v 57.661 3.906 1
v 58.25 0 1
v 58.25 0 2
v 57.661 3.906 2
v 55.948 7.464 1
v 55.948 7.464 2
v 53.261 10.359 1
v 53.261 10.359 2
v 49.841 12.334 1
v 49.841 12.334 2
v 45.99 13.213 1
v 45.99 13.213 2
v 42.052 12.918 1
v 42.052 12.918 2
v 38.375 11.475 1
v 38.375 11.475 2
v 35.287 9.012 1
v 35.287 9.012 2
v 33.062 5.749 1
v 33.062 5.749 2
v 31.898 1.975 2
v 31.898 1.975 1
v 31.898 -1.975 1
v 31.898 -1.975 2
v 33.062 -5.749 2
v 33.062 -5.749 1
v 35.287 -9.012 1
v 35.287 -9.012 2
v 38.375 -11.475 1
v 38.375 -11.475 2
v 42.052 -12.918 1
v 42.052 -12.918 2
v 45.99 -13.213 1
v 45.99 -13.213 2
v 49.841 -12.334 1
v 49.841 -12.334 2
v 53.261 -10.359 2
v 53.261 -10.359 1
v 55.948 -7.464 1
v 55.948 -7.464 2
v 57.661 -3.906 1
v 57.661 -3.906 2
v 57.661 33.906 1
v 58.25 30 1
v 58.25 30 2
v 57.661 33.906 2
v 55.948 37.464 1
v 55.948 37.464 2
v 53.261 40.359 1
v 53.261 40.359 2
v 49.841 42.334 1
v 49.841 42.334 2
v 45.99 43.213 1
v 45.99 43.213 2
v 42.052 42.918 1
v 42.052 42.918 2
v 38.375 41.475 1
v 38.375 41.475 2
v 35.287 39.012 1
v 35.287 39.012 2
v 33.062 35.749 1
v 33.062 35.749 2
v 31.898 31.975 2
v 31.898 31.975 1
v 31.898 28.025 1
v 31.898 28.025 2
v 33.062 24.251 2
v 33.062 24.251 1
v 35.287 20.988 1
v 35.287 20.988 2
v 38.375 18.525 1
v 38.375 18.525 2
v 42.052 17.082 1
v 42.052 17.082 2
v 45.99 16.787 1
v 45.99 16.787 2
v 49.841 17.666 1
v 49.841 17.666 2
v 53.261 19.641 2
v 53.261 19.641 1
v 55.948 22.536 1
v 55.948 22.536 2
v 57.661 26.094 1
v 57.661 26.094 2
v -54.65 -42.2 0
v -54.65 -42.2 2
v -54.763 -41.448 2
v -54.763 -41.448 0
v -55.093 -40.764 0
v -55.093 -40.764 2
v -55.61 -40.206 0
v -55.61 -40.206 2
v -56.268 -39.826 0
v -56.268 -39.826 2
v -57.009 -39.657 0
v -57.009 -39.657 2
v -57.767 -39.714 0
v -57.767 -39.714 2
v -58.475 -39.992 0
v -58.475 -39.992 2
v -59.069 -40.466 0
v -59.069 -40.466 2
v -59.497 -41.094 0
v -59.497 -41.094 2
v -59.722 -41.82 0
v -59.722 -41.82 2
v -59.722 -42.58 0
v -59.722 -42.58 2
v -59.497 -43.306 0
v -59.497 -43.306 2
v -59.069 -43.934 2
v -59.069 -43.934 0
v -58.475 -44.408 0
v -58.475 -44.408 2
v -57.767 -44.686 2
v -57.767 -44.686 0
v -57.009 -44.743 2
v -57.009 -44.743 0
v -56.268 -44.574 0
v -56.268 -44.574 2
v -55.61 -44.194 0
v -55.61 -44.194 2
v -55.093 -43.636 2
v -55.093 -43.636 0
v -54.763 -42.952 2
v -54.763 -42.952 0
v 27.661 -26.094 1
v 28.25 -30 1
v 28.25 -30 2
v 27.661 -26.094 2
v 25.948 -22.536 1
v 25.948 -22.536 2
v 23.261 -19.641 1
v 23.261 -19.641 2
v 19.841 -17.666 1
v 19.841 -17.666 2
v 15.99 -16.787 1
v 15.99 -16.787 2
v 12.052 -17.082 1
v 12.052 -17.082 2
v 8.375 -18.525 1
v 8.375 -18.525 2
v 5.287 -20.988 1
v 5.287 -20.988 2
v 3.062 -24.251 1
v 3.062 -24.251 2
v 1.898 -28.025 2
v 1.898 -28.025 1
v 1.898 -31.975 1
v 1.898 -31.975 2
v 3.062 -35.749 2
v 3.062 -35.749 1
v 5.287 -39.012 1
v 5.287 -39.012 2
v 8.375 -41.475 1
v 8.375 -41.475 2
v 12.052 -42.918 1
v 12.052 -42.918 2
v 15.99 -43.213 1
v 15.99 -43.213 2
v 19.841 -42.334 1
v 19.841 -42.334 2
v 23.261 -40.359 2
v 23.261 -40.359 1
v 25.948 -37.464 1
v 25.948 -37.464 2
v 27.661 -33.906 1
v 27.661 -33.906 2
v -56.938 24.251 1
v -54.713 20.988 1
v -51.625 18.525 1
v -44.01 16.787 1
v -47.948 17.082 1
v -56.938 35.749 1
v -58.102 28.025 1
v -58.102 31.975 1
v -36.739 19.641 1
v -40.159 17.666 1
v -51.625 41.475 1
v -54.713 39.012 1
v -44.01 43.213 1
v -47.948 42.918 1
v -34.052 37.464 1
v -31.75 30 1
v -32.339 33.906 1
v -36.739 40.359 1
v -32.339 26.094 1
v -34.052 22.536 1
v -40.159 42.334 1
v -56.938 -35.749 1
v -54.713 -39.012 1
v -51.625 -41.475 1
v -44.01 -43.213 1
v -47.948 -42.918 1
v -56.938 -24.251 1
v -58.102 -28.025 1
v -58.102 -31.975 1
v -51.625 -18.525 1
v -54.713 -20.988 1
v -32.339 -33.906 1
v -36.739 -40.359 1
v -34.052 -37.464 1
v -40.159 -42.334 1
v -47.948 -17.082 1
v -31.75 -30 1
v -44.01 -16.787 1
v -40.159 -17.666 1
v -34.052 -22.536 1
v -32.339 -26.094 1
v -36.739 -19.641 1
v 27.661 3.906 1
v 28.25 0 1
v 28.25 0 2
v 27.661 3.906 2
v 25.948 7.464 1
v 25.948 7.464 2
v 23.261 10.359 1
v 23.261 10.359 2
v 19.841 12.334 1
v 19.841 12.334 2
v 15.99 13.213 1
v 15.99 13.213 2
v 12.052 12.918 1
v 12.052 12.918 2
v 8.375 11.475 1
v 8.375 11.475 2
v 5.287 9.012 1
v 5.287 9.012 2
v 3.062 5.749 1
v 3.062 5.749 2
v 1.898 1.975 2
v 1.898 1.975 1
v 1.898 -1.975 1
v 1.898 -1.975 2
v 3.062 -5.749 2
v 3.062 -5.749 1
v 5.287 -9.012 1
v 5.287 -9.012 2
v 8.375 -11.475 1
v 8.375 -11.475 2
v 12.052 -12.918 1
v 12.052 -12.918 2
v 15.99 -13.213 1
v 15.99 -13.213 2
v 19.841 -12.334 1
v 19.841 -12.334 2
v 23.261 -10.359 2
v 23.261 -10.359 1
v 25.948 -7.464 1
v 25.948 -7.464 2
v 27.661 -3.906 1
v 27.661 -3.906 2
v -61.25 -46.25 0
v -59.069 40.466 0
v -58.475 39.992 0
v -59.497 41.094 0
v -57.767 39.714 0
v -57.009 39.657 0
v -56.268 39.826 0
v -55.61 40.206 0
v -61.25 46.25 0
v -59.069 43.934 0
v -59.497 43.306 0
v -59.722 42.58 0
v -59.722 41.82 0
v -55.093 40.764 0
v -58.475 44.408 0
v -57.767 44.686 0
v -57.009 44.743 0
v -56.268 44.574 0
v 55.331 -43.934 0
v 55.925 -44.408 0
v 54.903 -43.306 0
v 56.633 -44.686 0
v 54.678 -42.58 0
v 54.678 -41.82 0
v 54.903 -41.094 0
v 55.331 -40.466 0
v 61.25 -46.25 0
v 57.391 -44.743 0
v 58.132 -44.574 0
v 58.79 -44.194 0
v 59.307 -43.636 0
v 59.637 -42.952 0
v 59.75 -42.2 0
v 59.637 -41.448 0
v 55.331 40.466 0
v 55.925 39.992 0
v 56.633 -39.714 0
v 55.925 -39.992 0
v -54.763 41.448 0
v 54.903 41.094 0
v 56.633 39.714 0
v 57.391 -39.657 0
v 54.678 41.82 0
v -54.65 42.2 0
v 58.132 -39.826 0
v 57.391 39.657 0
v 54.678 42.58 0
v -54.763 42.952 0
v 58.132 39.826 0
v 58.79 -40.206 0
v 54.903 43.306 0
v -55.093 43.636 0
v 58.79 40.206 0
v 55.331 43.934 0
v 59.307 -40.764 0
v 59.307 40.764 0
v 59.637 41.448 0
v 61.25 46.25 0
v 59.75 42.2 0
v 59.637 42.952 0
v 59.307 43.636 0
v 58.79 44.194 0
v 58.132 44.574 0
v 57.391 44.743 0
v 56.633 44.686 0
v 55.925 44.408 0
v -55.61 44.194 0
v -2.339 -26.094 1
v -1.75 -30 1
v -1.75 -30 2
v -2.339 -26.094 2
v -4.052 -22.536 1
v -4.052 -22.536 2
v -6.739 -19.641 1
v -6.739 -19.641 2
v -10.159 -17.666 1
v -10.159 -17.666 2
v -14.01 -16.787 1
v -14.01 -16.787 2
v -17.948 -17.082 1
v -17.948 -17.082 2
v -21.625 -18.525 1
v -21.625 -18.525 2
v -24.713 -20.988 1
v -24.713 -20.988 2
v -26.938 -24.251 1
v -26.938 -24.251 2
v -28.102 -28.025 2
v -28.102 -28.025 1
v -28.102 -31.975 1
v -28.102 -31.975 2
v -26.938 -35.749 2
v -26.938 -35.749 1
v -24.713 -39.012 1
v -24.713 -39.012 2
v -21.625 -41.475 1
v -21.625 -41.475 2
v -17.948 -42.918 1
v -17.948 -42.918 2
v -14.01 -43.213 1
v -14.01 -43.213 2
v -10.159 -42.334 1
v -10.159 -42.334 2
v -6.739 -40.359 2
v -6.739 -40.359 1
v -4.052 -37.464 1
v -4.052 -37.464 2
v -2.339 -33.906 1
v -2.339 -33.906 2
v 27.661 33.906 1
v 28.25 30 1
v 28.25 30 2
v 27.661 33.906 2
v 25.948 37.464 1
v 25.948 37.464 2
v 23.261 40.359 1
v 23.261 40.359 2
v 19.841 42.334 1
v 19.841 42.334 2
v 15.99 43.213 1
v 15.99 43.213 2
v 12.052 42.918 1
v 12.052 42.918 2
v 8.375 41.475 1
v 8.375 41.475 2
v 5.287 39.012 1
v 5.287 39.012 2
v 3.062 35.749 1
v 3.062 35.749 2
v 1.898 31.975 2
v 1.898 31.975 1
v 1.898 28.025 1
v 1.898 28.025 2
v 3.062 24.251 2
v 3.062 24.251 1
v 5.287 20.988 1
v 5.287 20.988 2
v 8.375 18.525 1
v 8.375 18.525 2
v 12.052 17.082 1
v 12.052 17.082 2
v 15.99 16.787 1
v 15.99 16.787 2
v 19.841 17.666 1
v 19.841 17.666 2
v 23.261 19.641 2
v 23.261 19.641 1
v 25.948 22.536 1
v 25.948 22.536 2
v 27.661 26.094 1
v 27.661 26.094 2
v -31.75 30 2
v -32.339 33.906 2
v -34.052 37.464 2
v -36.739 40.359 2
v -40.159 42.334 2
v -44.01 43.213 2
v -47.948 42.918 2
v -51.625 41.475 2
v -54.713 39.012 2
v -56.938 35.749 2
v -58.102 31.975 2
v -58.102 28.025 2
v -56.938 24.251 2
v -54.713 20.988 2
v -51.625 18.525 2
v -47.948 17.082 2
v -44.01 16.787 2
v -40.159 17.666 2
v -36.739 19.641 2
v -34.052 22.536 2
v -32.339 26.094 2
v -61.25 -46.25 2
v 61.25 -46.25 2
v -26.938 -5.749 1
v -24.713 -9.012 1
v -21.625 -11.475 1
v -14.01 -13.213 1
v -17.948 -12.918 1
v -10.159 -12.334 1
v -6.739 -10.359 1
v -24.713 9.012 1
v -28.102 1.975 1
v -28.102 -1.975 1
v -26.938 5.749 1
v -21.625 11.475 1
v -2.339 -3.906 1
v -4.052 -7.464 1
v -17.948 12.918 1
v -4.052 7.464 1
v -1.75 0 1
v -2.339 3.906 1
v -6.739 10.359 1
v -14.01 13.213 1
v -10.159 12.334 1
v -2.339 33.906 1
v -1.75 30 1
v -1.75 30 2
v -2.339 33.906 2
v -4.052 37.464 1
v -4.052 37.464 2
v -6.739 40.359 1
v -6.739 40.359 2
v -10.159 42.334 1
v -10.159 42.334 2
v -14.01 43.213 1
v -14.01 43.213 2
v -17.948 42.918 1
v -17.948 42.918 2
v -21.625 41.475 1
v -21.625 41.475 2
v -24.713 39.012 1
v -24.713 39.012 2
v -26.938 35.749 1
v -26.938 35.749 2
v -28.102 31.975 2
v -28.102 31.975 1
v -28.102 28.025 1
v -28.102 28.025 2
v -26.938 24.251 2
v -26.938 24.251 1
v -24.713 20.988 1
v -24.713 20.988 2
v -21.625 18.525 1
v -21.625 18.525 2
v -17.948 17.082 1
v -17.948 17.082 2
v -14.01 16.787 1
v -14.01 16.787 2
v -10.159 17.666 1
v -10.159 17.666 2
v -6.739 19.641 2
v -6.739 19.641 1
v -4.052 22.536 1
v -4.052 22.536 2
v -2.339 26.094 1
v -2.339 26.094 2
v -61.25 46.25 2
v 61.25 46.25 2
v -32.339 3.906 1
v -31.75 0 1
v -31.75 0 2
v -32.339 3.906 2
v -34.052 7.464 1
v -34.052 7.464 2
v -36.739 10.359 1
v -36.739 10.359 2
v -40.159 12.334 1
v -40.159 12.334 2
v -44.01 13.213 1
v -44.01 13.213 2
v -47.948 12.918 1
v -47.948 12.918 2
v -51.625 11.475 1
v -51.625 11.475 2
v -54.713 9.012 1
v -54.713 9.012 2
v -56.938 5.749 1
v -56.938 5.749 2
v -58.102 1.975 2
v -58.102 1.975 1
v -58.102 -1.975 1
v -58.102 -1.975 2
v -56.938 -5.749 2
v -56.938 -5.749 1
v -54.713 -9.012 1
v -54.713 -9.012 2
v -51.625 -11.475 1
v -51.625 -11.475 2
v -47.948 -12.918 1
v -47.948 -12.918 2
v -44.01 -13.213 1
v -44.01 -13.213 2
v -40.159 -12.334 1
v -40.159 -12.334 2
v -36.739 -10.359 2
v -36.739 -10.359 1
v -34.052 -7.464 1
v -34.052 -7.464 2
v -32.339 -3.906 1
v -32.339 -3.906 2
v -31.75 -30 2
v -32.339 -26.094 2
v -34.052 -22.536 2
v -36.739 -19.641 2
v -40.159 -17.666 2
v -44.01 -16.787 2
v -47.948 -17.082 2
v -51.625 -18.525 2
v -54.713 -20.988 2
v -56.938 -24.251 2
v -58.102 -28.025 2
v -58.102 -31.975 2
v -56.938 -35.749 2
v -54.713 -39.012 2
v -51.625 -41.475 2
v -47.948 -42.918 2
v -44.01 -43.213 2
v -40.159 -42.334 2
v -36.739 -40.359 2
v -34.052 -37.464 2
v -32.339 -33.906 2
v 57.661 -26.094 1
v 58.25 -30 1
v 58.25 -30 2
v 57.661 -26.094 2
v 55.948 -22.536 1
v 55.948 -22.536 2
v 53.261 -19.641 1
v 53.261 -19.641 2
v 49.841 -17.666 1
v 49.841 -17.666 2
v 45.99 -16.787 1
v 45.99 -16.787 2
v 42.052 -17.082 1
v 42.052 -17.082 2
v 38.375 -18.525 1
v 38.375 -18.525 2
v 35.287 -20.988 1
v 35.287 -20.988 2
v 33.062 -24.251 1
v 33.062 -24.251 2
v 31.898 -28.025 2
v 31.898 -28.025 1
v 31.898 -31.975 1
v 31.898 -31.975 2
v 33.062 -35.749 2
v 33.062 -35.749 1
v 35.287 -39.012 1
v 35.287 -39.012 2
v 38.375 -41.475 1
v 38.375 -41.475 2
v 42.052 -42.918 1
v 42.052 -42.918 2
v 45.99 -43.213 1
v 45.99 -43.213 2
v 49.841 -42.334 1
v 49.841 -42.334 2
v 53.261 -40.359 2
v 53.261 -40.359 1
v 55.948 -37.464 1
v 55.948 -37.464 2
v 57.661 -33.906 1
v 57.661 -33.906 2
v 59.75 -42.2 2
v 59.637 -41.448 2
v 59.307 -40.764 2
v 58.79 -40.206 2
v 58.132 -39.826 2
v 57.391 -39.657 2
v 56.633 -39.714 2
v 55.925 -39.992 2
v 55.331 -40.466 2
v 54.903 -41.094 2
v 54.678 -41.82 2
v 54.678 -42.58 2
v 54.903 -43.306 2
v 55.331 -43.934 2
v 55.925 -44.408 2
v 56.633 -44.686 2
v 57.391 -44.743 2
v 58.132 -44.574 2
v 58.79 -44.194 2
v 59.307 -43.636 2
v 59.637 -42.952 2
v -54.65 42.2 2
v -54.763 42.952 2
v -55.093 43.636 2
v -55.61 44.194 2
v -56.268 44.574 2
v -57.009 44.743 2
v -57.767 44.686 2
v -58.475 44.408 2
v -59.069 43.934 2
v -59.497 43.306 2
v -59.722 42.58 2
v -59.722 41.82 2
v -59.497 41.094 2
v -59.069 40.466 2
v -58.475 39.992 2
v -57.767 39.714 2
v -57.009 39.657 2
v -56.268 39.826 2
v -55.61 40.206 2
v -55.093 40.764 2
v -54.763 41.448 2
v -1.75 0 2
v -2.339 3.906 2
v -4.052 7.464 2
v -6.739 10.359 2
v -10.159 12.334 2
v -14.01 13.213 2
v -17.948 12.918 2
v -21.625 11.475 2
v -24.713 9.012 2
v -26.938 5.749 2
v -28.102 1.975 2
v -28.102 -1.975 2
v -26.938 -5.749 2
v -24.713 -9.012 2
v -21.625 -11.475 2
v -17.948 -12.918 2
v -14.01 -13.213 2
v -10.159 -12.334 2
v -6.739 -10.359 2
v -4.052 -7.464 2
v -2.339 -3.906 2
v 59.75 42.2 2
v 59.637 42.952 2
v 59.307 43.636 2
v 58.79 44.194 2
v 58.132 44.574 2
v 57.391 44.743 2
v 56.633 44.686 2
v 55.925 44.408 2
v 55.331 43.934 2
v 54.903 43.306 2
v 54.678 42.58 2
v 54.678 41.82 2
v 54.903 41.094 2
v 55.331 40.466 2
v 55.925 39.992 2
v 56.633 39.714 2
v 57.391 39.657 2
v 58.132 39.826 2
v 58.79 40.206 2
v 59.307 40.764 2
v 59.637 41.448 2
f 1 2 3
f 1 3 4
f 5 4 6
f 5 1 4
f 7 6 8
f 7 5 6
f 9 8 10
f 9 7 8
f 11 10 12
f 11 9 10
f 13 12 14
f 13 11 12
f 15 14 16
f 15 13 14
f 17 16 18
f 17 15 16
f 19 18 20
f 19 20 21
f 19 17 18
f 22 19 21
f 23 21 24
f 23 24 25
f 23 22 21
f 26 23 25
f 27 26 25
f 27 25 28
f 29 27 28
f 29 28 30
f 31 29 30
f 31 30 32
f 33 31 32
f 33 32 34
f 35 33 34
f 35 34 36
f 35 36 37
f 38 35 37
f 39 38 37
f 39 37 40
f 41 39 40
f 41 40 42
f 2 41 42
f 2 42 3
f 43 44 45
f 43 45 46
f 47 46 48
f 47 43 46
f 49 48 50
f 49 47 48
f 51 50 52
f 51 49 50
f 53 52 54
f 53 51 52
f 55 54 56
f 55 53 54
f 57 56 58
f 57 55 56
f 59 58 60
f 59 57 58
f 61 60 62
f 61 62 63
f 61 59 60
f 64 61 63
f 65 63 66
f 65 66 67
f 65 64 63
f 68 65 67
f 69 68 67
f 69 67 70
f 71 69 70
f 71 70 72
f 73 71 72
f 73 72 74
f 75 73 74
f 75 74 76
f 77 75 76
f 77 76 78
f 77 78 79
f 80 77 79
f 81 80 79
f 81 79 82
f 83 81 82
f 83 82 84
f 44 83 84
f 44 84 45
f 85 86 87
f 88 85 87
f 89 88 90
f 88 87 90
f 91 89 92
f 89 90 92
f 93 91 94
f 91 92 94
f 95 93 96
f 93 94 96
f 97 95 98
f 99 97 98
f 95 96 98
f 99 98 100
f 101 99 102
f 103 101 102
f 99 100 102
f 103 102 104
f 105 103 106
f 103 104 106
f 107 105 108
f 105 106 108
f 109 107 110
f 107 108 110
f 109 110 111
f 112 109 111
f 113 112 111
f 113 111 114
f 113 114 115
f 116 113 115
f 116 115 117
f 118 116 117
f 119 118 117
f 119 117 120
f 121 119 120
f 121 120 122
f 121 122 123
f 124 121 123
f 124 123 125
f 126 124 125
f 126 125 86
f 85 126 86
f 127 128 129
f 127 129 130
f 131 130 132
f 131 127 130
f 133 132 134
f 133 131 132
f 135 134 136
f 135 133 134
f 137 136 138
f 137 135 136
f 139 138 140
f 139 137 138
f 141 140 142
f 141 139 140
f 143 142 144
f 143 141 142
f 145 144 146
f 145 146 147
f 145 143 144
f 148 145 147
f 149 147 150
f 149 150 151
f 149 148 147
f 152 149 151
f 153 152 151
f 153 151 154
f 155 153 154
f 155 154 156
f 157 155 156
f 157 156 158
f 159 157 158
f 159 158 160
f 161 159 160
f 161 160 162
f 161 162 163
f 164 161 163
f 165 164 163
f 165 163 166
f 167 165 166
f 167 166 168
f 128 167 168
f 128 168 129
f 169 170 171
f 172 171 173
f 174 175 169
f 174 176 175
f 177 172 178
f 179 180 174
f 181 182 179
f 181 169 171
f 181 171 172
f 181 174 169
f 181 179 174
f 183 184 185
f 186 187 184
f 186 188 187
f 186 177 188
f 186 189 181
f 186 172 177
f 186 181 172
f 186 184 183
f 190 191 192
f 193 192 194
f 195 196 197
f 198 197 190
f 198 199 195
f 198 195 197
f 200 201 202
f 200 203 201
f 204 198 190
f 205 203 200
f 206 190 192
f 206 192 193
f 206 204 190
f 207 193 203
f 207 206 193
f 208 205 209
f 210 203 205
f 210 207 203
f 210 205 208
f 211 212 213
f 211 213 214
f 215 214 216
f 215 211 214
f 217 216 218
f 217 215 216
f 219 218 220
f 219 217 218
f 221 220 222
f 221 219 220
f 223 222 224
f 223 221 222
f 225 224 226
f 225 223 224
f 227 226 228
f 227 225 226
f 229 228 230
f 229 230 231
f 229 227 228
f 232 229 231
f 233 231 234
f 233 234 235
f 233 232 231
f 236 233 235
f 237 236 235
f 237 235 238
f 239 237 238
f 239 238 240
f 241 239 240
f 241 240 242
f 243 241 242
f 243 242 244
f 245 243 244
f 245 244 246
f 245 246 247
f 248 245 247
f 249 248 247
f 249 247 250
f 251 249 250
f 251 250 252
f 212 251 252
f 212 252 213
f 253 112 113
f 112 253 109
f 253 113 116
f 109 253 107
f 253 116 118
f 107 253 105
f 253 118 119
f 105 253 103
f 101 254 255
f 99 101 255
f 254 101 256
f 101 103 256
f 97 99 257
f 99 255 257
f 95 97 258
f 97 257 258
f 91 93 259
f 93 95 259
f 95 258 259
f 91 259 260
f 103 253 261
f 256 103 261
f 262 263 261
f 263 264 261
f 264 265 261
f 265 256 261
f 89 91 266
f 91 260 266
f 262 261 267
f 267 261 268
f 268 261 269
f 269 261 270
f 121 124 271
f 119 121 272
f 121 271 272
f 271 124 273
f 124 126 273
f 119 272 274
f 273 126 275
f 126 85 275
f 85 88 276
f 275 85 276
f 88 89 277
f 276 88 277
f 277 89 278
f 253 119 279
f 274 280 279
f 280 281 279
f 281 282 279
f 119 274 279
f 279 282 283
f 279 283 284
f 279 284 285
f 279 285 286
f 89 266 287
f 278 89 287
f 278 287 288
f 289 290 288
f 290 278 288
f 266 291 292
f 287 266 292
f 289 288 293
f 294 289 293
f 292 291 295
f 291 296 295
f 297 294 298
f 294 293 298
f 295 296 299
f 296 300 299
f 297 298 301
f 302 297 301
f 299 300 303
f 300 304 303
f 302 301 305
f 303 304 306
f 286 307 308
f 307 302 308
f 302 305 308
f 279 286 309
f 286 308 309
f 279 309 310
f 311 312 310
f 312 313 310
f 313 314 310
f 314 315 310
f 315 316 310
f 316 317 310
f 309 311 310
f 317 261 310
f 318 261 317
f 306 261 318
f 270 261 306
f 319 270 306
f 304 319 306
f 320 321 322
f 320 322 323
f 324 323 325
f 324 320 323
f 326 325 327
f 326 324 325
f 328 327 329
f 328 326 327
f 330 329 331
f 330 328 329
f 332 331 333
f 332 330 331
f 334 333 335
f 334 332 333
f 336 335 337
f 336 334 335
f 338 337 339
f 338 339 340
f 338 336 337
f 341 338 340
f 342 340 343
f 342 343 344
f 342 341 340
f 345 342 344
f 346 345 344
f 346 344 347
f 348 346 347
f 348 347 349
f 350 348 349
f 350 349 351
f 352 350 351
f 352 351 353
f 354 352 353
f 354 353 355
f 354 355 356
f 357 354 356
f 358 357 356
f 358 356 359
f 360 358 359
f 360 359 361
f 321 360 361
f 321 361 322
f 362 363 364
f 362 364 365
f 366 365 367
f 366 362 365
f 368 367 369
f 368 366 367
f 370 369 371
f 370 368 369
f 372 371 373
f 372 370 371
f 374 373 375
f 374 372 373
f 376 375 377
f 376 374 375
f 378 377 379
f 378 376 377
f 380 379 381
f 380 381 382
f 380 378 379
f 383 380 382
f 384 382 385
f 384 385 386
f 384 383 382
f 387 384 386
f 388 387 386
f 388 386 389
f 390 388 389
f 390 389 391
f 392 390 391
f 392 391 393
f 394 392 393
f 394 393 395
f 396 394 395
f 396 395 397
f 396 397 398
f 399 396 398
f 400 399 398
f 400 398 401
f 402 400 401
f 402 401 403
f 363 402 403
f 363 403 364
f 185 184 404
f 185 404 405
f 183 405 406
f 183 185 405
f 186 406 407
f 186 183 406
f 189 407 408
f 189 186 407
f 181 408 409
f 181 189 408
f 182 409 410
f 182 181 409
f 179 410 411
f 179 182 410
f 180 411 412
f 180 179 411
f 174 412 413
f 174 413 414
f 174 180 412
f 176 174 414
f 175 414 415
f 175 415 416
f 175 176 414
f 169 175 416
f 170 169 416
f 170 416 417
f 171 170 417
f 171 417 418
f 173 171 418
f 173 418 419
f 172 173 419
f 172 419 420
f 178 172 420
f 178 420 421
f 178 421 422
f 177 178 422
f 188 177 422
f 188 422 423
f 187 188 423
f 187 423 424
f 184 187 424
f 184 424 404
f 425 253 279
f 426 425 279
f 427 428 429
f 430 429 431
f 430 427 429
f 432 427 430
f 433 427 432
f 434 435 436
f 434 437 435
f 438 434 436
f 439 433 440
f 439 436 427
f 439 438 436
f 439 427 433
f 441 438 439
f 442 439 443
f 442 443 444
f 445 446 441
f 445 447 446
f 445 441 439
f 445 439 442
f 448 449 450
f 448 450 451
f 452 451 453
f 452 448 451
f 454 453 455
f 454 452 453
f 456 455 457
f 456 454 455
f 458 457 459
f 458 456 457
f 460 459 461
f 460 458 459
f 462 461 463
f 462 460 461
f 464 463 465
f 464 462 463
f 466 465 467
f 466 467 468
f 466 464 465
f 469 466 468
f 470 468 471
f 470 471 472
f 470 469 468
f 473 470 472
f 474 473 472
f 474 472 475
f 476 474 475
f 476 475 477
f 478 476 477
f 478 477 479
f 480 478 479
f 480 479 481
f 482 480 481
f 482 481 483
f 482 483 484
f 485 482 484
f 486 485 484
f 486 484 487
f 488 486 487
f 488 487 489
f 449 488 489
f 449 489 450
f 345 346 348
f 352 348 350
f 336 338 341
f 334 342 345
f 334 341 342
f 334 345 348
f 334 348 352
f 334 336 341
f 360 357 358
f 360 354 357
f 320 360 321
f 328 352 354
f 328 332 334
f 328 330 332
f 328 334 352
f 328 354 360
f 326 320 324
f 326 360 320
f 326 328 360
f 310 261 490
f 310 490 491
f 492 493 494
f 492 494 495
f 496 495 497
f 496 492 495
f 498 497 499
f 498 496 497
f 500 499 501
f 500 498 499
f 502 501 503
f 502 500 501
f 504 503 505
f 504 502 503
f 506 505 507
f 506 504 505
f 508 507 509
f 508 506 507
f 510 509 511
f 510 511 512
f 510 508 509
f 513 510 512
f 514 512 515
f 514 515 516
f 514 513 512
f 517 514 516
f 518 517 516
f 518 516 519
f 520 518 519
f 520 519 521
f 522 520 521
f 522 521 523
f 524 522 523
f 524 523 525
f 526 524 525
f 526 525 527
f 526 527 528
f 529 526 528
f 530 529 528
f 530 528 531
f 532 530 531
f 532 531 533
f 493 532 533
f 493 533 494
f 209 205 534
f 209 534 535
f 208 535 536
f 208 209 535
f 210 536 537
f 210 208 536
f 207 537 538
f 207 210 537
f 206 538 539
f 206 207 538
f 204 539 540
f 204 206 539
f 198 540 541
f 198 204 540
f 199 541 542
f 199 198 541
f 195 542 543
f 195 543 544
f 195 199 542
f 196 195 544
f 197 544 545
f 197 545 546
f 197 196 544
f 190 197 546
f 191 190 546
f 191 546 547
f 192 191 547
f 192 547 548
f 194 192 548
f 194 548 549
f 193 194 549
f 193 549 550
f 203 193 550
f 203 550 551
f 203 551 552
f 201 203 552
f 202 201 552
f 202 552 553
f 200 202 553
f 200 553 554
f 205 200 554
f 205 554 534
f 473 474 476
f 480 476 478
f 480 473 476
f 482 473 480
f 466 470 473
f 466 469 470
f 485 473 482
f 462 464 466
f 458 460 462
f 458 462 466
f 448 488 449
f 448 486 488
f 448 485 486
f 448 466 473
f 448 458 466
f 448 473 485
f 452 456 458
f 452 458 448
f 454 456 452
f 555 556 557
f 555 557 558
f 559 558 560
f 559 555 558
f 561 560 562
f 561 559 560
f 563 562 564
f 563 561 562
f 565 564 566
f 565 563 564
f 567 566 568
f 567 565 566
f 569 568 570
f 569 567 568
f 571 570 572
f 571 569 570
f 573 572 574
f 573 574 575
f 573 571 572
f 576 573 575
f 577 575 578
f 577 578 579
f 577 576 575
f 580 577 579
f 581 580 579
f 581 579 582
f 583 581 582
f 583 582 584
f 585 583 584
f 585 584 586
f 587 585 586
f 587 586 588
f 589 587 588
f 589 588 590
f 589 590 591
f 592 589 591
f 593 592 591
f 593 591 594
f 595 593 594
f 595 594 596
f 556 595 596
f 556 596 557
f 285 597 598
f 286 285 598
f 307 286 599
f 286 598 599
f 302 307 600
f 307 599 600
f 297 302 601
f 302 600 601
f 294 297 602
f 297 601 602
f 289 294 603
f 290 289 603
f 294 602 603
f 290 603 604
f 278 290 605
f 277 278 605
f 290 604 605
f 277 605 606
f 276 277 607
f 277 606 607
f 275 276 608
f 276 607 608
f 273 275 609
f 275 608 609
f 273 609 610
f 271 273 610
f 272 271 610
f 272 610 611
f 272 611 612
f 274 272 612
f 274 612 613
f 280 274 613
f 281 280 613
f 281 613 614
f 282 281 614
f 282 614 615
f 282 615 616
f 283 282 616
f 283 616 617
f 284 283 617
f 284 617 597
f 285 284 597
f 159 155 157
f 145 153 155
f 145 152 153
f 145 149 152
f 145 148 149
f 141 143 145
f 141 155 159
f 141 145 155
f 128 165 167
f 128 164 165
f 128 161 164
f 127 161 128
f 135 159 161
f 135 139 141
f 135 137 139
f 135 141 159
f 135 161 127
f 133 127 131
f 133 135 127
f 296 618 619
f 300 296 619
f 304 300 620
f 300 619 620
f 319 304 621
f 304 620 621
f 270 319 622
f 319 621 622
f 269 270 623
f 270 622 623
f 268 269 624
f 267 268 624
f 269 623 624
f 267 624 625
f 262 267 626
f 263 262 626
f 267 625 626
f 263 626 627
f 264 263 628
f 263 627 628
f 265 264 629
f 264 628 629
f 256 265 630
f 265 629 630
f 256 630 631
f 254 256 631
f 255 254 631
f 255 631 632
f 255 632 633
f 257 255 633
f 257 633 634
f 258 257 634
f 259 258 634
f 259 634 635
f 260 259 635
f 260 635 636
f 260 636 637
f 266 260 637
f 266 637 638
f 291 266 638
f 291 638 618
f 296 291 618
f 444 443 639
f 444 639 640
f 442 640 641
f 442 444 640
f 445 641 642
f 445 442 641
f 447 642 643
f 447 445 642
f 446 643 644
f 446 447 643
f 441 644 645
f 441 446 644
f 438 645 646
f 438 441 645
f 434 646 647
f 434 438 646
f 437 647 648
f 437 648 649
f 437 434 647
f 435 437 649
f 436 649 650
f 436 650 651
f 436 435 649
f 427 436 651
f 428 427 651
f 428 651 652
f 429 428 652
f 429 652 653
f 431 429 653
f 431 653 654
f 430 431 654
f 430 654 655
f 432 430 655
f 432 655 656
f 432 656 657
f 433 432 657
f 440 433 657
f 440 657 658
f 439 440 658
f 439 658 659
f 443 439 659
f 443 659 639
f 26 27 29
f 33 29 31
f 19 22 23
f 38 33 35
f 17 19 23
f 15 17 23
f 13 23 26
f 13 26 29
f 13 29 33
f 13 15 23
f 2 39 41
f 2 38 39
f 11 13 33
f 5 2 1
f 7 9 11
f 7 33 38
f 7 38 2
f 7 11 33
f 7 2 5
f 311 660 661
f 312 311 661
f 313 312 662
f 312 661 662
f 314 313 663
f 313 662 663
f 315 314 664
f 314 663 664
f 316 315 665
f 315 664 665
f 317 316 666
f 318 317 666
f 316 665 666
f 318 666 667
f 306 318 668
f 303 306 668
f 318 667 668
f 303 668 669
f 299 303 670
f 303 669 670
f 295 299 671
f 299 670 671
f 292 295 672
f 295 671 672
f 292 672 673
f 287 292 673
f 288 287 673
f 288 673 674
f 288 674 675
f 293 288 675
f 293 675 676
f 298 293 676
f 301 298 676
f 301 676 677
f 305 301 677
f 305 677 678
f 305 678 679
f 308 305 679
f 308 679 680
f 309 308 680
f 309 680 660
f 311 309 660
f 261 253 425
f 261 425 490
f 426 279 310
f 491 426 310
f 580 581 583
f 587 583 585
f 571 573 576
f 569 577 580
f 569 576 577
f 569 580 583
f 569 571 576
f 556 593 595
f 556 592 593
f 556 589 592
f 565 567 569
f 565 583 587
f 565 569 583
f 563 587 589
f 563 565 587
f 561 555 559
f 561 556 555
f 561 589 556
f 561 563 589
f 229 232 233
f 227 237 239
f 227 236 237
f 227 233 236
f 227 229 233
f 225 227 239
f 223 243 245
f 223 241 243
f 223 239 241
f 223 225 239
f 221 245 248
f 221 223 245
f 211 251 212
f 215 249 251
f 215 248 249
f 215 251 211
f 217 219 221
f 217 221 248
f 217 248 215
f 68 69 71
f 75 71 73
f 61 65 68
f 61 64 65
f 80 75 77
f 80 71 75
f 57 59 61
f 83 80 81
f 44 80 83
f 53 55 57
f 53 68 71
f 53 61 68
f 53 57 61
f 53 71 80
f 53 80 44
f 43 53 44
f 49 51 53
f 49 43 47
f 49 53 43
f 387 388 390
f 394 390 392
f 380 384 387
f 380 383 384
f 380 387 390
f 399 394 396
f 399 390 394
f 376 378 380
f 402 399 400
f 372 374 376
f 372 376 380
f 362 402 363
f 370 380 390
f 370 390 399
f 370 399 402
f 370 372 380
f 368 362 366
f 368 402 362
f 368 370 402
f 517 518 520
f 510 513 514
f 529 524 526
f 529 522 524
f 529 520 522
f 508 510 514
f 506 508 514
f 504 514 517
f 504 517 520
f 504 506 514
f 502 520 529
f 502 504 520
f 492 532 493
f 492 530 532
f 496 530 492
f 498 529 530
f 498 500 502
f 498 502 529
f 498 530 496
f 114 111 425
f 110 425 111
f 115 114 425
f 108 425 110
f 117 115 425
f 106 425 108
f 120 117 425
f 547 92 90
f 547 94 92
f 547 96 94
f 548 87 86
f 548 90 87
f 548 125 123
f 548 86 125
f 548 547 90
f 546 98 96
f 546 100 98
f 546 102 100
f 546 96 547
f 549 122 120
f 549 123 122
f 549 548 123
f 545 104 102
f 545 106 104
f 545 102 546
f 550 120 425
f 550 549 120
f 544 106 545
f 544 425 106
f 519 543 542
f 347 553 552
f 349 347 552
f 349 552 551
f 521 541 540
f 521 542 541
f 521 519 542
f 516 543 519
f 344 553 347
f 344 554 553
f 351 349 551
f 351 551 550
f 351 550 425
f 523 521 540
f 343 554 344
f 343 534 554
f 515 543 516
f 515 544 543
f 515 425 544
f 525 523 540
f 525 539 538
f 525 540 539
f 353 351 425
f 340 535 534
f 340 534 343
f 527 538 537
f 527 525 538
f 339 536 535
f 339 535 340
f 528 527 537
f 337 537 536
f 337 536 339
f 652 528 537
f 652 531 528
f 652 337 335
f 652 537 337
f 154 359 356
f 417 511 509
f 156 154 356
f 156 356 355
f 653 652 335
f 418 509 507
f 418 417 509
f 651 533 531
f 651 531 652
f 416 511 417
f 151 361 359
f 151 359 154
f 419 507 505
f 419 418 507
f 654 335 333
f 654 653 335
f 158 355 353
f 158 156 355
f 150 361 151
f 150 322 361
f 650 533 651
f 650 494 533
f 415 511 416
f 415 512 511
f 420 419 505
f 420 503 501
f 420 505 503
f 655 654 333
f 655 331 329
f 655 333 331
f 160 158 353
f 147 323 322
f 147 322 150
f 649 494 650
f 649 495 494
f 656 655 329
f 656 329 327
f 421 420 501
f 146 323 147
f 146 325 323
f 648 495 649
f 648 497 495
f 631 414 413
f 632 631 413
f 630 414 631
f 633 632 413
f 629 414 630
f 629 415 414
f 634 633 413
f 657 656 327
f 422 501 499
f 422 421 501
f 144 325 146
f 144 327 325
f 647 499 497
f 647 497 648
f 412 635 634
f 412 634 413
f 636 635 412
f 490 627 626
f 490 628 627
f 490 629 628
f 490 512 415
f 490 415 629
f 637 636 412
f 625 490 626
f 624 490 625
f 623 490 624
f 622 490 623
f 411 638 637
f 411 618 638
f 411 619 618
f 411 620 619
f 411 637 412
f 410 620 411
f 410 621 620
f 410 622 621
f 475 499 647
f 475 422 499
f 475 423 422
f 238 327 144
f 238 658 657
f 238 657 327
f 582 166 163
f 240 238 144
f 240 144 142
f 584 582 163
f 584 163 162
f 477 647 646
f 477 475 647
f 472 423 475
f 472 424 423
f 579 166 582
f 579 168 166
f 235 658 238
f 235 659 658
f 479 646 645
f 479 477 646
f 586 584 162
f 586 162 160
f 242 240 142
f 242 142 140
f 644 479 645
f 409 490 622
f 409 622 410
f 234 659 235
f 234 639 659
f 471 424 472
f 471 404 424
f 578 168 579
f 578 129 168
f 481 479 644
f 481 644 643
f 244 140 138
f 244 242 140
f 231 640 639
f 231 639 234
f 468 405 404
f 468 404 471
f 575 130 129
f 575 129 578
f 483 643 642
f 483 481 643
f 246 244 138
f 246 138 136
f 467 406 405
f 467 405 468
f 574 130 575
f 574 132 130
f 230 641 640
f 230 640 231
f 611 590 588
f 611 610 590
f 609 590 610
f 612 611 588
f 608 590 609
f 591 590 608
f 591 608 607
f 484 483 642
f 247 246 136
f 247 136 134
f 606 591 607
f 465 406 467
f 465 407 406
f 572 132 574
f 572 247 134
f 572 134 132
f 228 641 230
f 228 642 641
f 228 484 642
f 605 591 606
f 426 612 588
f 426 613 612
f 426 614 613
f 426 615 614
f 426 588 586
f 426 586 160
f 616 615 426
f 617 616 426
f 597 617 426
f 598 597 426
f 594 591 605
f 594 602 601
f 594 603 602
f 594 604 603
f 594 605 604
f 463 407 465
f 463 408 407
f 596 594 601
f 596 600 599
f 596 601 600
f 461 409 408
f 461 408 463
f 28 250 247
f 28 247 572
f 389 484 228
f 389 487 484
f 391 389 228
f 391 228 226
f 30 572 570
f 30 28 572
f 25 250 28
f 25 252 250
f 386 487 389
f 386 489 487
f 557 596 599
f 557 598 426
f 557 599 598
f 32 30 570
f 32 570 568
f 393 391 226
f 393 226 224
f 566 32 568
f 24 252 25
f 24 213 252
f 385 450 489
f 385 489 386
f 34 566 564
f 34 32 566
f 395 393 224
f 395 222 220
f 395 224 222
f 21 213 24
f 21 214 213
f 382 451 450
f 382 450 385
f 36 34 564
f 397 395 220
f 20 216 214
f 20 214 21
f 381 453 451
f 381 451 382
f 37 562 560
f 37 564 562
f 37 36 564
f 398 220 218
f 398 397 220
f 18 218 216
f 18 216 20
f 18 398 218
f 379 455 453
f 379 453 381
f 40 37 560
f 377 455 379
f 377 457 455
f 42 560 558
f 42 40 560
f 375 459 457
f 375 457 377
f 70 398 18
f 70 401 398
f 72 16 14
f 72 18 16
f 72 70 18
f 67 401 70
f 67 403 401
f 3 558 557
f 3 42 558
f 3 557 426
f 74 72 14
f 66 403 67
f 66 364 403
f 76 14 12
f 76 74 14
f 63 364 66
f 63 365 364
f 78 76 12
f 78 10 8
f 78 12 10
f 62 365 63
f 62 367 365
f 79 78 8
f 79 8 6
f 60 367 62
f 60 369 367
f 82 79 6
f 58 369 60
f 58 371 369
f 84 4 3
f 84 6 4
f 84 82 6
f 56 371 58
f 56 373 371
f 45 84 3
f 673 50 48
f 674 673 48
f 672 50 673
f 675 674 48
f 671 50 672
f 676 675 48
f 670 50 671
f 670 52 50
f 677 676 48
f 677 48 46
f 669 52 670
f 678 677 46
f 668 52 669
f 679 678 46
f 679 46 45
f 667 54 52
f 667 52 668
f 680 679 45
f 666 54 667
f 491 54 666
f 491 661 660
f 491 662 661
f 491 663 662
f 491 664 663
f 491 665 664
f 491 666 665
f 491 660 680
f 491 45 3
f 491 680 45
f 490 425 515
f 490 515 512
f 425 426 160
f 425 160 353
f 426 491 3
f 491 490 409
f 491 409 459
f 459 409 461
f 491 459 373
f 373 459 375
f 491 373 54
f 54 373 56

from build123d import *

# Parameters (mm, degrees)
F0_W     = 122.5
F0_H     = 92.5
F0_R     = 13.25
F1_DEPTH = 1
F2_DEPTH = 2
F3_R     = 2.55
F4_DEPTH = 2.001


# Not quite as in the source:
# - a feature names something its author has since deleted; it is built from what else it names


with BuildPart() as f1:
    # F0 (on Top) → F1 (new body)
    with BuildSketch(Plane.XY):
        Rectangle(F0_W, F0_H)
        with Locations((-45, -30)):
            Circle(F0_R, mode=Mode.SUBTRACT)
        with Locations((-15, -30)):
            Circle(F0_R, mode=Mode.SUBTRACT)
        with Locations((15, -30)):
            Circle(F0_R, mode=Mode.SUBTRACT)
        with Locations((45, -30)):
            Circle(F0_R, mode=Mode.SUBTRACT)
        with Locations((-45, 0)):
            Circle(F0_R, mode=Mode.SUBTRACT)
        with Locations((-15, 0)):
            Circle(F0_R, mode=Mode.SUBTRACT)
        with Locations((-45, 30)):
            Circle(F0_R, mode=Mode.SUBTRACT)
        with Locations((-15, 30)):
            Circle(F0_R, mode=Mode.SUBTRACT)
        with Locations((15, 0)):
            Circle(F0_R, mode=Mode.SUBTRACT)
        with Locations((45, 0)):
            Circle(F0_R, mode=Mode.SUBTRACT)
        with Locations((15, 30)):
            Circle(F0_R, mode=Mode.SUBTRACT)
        with Locations((45, 30)):
            Circle(F0_R, mode=Mode.SUBTRACT)
        with Locations((-45, 30)):
            Circle(F0_R)
        with Locations((-15, 30)):
            Circle(F0_R)
        with Locations((15, 30)):
            Circle(F0_R)
        with Locations((45, 30)):
            Circle(F0_R)
        with Locations((45, 0)):
            Circle(F0_R)
        with Locations((-15, 0)):
            Circle(F0_R)
        with Locations((-45, 0)):
            Circle(F0_R)
        with Locations((15, 0)):
            Circle(F0_R)
        with Locations((15, -30)):
            Circle(F0_R)
        with Locations((-15, -30)):
            Circle(F0_R)
        with Locations((-45, -30)):
            Circle(F0_R)
        with Locations((45, -30)):
            Circle(F0_R)
    extrude(amount=F1_DEPTH)

    # F0 (on Top) → F2 (join)
    with BuildSketch(Plane.XY):
        Rectangle(F0_W, F0_H)
        with Locations((-45, -30)):
            Circle(F0_R, mode=Mode.SUBTRACT)
        with Locations((-15, -30)):
            Circle(F0_R, mode=Mode.SUBTRACT)
        with Locations((15, -30)):
            Circle(F0_R, mode=Mode.SUBTRACT)
        with Locations((45, -30)):
            Circle(F0_R, mode=Mode.SUBTRACT)
        with Locations((-45, 0)):
            Circle(F0_R, mode=Mode.SUBTRACT)
        with Locations((-15, 0)):
            Circle(F0_R, mode=Mode.SUBTRACT)
        with Locations((-45, 30)):
            Circle(F0_R, mode=Mode.SUBTRACT)
        with Locations((-15, 30)):
            Circle(F0_R, mode=Mode.SUBTRACT)
        with Locations((15, 0)):
            Circle(F0_R, mode=Mode.SUBTRACT)
        with Locations((45, 0)):
            Circle(F0_R, mode=Mode.SUBTRACT)
        with Locations((15, 30)):
            Circle(F0_R, mode=Mode.SUBTRACT)
        with Locations((45, 30)):
            Circle(F0_R, mode=Mode.SUBTRACT)
    extrude(amount=F2_DEPTH)

    # F3 (on face) → F4 (cut, through all)
    with BuildSketch(Plane.XY.offset(2)):
        with Locations((-57.2, 42.2)):
            Circle(F3_R)
        with Locations((57.2, 42.2)):
            Circle(F3_R)
        with Locations((-57.2, -42.2)):
            Circle(F3_R)
        with Locations((57.2, -42.2)):
            Circle(F3_R)
    extrude(amount=-F4_DEPTH, mode=Mode.SUBTRACT)


solid = f1.part
